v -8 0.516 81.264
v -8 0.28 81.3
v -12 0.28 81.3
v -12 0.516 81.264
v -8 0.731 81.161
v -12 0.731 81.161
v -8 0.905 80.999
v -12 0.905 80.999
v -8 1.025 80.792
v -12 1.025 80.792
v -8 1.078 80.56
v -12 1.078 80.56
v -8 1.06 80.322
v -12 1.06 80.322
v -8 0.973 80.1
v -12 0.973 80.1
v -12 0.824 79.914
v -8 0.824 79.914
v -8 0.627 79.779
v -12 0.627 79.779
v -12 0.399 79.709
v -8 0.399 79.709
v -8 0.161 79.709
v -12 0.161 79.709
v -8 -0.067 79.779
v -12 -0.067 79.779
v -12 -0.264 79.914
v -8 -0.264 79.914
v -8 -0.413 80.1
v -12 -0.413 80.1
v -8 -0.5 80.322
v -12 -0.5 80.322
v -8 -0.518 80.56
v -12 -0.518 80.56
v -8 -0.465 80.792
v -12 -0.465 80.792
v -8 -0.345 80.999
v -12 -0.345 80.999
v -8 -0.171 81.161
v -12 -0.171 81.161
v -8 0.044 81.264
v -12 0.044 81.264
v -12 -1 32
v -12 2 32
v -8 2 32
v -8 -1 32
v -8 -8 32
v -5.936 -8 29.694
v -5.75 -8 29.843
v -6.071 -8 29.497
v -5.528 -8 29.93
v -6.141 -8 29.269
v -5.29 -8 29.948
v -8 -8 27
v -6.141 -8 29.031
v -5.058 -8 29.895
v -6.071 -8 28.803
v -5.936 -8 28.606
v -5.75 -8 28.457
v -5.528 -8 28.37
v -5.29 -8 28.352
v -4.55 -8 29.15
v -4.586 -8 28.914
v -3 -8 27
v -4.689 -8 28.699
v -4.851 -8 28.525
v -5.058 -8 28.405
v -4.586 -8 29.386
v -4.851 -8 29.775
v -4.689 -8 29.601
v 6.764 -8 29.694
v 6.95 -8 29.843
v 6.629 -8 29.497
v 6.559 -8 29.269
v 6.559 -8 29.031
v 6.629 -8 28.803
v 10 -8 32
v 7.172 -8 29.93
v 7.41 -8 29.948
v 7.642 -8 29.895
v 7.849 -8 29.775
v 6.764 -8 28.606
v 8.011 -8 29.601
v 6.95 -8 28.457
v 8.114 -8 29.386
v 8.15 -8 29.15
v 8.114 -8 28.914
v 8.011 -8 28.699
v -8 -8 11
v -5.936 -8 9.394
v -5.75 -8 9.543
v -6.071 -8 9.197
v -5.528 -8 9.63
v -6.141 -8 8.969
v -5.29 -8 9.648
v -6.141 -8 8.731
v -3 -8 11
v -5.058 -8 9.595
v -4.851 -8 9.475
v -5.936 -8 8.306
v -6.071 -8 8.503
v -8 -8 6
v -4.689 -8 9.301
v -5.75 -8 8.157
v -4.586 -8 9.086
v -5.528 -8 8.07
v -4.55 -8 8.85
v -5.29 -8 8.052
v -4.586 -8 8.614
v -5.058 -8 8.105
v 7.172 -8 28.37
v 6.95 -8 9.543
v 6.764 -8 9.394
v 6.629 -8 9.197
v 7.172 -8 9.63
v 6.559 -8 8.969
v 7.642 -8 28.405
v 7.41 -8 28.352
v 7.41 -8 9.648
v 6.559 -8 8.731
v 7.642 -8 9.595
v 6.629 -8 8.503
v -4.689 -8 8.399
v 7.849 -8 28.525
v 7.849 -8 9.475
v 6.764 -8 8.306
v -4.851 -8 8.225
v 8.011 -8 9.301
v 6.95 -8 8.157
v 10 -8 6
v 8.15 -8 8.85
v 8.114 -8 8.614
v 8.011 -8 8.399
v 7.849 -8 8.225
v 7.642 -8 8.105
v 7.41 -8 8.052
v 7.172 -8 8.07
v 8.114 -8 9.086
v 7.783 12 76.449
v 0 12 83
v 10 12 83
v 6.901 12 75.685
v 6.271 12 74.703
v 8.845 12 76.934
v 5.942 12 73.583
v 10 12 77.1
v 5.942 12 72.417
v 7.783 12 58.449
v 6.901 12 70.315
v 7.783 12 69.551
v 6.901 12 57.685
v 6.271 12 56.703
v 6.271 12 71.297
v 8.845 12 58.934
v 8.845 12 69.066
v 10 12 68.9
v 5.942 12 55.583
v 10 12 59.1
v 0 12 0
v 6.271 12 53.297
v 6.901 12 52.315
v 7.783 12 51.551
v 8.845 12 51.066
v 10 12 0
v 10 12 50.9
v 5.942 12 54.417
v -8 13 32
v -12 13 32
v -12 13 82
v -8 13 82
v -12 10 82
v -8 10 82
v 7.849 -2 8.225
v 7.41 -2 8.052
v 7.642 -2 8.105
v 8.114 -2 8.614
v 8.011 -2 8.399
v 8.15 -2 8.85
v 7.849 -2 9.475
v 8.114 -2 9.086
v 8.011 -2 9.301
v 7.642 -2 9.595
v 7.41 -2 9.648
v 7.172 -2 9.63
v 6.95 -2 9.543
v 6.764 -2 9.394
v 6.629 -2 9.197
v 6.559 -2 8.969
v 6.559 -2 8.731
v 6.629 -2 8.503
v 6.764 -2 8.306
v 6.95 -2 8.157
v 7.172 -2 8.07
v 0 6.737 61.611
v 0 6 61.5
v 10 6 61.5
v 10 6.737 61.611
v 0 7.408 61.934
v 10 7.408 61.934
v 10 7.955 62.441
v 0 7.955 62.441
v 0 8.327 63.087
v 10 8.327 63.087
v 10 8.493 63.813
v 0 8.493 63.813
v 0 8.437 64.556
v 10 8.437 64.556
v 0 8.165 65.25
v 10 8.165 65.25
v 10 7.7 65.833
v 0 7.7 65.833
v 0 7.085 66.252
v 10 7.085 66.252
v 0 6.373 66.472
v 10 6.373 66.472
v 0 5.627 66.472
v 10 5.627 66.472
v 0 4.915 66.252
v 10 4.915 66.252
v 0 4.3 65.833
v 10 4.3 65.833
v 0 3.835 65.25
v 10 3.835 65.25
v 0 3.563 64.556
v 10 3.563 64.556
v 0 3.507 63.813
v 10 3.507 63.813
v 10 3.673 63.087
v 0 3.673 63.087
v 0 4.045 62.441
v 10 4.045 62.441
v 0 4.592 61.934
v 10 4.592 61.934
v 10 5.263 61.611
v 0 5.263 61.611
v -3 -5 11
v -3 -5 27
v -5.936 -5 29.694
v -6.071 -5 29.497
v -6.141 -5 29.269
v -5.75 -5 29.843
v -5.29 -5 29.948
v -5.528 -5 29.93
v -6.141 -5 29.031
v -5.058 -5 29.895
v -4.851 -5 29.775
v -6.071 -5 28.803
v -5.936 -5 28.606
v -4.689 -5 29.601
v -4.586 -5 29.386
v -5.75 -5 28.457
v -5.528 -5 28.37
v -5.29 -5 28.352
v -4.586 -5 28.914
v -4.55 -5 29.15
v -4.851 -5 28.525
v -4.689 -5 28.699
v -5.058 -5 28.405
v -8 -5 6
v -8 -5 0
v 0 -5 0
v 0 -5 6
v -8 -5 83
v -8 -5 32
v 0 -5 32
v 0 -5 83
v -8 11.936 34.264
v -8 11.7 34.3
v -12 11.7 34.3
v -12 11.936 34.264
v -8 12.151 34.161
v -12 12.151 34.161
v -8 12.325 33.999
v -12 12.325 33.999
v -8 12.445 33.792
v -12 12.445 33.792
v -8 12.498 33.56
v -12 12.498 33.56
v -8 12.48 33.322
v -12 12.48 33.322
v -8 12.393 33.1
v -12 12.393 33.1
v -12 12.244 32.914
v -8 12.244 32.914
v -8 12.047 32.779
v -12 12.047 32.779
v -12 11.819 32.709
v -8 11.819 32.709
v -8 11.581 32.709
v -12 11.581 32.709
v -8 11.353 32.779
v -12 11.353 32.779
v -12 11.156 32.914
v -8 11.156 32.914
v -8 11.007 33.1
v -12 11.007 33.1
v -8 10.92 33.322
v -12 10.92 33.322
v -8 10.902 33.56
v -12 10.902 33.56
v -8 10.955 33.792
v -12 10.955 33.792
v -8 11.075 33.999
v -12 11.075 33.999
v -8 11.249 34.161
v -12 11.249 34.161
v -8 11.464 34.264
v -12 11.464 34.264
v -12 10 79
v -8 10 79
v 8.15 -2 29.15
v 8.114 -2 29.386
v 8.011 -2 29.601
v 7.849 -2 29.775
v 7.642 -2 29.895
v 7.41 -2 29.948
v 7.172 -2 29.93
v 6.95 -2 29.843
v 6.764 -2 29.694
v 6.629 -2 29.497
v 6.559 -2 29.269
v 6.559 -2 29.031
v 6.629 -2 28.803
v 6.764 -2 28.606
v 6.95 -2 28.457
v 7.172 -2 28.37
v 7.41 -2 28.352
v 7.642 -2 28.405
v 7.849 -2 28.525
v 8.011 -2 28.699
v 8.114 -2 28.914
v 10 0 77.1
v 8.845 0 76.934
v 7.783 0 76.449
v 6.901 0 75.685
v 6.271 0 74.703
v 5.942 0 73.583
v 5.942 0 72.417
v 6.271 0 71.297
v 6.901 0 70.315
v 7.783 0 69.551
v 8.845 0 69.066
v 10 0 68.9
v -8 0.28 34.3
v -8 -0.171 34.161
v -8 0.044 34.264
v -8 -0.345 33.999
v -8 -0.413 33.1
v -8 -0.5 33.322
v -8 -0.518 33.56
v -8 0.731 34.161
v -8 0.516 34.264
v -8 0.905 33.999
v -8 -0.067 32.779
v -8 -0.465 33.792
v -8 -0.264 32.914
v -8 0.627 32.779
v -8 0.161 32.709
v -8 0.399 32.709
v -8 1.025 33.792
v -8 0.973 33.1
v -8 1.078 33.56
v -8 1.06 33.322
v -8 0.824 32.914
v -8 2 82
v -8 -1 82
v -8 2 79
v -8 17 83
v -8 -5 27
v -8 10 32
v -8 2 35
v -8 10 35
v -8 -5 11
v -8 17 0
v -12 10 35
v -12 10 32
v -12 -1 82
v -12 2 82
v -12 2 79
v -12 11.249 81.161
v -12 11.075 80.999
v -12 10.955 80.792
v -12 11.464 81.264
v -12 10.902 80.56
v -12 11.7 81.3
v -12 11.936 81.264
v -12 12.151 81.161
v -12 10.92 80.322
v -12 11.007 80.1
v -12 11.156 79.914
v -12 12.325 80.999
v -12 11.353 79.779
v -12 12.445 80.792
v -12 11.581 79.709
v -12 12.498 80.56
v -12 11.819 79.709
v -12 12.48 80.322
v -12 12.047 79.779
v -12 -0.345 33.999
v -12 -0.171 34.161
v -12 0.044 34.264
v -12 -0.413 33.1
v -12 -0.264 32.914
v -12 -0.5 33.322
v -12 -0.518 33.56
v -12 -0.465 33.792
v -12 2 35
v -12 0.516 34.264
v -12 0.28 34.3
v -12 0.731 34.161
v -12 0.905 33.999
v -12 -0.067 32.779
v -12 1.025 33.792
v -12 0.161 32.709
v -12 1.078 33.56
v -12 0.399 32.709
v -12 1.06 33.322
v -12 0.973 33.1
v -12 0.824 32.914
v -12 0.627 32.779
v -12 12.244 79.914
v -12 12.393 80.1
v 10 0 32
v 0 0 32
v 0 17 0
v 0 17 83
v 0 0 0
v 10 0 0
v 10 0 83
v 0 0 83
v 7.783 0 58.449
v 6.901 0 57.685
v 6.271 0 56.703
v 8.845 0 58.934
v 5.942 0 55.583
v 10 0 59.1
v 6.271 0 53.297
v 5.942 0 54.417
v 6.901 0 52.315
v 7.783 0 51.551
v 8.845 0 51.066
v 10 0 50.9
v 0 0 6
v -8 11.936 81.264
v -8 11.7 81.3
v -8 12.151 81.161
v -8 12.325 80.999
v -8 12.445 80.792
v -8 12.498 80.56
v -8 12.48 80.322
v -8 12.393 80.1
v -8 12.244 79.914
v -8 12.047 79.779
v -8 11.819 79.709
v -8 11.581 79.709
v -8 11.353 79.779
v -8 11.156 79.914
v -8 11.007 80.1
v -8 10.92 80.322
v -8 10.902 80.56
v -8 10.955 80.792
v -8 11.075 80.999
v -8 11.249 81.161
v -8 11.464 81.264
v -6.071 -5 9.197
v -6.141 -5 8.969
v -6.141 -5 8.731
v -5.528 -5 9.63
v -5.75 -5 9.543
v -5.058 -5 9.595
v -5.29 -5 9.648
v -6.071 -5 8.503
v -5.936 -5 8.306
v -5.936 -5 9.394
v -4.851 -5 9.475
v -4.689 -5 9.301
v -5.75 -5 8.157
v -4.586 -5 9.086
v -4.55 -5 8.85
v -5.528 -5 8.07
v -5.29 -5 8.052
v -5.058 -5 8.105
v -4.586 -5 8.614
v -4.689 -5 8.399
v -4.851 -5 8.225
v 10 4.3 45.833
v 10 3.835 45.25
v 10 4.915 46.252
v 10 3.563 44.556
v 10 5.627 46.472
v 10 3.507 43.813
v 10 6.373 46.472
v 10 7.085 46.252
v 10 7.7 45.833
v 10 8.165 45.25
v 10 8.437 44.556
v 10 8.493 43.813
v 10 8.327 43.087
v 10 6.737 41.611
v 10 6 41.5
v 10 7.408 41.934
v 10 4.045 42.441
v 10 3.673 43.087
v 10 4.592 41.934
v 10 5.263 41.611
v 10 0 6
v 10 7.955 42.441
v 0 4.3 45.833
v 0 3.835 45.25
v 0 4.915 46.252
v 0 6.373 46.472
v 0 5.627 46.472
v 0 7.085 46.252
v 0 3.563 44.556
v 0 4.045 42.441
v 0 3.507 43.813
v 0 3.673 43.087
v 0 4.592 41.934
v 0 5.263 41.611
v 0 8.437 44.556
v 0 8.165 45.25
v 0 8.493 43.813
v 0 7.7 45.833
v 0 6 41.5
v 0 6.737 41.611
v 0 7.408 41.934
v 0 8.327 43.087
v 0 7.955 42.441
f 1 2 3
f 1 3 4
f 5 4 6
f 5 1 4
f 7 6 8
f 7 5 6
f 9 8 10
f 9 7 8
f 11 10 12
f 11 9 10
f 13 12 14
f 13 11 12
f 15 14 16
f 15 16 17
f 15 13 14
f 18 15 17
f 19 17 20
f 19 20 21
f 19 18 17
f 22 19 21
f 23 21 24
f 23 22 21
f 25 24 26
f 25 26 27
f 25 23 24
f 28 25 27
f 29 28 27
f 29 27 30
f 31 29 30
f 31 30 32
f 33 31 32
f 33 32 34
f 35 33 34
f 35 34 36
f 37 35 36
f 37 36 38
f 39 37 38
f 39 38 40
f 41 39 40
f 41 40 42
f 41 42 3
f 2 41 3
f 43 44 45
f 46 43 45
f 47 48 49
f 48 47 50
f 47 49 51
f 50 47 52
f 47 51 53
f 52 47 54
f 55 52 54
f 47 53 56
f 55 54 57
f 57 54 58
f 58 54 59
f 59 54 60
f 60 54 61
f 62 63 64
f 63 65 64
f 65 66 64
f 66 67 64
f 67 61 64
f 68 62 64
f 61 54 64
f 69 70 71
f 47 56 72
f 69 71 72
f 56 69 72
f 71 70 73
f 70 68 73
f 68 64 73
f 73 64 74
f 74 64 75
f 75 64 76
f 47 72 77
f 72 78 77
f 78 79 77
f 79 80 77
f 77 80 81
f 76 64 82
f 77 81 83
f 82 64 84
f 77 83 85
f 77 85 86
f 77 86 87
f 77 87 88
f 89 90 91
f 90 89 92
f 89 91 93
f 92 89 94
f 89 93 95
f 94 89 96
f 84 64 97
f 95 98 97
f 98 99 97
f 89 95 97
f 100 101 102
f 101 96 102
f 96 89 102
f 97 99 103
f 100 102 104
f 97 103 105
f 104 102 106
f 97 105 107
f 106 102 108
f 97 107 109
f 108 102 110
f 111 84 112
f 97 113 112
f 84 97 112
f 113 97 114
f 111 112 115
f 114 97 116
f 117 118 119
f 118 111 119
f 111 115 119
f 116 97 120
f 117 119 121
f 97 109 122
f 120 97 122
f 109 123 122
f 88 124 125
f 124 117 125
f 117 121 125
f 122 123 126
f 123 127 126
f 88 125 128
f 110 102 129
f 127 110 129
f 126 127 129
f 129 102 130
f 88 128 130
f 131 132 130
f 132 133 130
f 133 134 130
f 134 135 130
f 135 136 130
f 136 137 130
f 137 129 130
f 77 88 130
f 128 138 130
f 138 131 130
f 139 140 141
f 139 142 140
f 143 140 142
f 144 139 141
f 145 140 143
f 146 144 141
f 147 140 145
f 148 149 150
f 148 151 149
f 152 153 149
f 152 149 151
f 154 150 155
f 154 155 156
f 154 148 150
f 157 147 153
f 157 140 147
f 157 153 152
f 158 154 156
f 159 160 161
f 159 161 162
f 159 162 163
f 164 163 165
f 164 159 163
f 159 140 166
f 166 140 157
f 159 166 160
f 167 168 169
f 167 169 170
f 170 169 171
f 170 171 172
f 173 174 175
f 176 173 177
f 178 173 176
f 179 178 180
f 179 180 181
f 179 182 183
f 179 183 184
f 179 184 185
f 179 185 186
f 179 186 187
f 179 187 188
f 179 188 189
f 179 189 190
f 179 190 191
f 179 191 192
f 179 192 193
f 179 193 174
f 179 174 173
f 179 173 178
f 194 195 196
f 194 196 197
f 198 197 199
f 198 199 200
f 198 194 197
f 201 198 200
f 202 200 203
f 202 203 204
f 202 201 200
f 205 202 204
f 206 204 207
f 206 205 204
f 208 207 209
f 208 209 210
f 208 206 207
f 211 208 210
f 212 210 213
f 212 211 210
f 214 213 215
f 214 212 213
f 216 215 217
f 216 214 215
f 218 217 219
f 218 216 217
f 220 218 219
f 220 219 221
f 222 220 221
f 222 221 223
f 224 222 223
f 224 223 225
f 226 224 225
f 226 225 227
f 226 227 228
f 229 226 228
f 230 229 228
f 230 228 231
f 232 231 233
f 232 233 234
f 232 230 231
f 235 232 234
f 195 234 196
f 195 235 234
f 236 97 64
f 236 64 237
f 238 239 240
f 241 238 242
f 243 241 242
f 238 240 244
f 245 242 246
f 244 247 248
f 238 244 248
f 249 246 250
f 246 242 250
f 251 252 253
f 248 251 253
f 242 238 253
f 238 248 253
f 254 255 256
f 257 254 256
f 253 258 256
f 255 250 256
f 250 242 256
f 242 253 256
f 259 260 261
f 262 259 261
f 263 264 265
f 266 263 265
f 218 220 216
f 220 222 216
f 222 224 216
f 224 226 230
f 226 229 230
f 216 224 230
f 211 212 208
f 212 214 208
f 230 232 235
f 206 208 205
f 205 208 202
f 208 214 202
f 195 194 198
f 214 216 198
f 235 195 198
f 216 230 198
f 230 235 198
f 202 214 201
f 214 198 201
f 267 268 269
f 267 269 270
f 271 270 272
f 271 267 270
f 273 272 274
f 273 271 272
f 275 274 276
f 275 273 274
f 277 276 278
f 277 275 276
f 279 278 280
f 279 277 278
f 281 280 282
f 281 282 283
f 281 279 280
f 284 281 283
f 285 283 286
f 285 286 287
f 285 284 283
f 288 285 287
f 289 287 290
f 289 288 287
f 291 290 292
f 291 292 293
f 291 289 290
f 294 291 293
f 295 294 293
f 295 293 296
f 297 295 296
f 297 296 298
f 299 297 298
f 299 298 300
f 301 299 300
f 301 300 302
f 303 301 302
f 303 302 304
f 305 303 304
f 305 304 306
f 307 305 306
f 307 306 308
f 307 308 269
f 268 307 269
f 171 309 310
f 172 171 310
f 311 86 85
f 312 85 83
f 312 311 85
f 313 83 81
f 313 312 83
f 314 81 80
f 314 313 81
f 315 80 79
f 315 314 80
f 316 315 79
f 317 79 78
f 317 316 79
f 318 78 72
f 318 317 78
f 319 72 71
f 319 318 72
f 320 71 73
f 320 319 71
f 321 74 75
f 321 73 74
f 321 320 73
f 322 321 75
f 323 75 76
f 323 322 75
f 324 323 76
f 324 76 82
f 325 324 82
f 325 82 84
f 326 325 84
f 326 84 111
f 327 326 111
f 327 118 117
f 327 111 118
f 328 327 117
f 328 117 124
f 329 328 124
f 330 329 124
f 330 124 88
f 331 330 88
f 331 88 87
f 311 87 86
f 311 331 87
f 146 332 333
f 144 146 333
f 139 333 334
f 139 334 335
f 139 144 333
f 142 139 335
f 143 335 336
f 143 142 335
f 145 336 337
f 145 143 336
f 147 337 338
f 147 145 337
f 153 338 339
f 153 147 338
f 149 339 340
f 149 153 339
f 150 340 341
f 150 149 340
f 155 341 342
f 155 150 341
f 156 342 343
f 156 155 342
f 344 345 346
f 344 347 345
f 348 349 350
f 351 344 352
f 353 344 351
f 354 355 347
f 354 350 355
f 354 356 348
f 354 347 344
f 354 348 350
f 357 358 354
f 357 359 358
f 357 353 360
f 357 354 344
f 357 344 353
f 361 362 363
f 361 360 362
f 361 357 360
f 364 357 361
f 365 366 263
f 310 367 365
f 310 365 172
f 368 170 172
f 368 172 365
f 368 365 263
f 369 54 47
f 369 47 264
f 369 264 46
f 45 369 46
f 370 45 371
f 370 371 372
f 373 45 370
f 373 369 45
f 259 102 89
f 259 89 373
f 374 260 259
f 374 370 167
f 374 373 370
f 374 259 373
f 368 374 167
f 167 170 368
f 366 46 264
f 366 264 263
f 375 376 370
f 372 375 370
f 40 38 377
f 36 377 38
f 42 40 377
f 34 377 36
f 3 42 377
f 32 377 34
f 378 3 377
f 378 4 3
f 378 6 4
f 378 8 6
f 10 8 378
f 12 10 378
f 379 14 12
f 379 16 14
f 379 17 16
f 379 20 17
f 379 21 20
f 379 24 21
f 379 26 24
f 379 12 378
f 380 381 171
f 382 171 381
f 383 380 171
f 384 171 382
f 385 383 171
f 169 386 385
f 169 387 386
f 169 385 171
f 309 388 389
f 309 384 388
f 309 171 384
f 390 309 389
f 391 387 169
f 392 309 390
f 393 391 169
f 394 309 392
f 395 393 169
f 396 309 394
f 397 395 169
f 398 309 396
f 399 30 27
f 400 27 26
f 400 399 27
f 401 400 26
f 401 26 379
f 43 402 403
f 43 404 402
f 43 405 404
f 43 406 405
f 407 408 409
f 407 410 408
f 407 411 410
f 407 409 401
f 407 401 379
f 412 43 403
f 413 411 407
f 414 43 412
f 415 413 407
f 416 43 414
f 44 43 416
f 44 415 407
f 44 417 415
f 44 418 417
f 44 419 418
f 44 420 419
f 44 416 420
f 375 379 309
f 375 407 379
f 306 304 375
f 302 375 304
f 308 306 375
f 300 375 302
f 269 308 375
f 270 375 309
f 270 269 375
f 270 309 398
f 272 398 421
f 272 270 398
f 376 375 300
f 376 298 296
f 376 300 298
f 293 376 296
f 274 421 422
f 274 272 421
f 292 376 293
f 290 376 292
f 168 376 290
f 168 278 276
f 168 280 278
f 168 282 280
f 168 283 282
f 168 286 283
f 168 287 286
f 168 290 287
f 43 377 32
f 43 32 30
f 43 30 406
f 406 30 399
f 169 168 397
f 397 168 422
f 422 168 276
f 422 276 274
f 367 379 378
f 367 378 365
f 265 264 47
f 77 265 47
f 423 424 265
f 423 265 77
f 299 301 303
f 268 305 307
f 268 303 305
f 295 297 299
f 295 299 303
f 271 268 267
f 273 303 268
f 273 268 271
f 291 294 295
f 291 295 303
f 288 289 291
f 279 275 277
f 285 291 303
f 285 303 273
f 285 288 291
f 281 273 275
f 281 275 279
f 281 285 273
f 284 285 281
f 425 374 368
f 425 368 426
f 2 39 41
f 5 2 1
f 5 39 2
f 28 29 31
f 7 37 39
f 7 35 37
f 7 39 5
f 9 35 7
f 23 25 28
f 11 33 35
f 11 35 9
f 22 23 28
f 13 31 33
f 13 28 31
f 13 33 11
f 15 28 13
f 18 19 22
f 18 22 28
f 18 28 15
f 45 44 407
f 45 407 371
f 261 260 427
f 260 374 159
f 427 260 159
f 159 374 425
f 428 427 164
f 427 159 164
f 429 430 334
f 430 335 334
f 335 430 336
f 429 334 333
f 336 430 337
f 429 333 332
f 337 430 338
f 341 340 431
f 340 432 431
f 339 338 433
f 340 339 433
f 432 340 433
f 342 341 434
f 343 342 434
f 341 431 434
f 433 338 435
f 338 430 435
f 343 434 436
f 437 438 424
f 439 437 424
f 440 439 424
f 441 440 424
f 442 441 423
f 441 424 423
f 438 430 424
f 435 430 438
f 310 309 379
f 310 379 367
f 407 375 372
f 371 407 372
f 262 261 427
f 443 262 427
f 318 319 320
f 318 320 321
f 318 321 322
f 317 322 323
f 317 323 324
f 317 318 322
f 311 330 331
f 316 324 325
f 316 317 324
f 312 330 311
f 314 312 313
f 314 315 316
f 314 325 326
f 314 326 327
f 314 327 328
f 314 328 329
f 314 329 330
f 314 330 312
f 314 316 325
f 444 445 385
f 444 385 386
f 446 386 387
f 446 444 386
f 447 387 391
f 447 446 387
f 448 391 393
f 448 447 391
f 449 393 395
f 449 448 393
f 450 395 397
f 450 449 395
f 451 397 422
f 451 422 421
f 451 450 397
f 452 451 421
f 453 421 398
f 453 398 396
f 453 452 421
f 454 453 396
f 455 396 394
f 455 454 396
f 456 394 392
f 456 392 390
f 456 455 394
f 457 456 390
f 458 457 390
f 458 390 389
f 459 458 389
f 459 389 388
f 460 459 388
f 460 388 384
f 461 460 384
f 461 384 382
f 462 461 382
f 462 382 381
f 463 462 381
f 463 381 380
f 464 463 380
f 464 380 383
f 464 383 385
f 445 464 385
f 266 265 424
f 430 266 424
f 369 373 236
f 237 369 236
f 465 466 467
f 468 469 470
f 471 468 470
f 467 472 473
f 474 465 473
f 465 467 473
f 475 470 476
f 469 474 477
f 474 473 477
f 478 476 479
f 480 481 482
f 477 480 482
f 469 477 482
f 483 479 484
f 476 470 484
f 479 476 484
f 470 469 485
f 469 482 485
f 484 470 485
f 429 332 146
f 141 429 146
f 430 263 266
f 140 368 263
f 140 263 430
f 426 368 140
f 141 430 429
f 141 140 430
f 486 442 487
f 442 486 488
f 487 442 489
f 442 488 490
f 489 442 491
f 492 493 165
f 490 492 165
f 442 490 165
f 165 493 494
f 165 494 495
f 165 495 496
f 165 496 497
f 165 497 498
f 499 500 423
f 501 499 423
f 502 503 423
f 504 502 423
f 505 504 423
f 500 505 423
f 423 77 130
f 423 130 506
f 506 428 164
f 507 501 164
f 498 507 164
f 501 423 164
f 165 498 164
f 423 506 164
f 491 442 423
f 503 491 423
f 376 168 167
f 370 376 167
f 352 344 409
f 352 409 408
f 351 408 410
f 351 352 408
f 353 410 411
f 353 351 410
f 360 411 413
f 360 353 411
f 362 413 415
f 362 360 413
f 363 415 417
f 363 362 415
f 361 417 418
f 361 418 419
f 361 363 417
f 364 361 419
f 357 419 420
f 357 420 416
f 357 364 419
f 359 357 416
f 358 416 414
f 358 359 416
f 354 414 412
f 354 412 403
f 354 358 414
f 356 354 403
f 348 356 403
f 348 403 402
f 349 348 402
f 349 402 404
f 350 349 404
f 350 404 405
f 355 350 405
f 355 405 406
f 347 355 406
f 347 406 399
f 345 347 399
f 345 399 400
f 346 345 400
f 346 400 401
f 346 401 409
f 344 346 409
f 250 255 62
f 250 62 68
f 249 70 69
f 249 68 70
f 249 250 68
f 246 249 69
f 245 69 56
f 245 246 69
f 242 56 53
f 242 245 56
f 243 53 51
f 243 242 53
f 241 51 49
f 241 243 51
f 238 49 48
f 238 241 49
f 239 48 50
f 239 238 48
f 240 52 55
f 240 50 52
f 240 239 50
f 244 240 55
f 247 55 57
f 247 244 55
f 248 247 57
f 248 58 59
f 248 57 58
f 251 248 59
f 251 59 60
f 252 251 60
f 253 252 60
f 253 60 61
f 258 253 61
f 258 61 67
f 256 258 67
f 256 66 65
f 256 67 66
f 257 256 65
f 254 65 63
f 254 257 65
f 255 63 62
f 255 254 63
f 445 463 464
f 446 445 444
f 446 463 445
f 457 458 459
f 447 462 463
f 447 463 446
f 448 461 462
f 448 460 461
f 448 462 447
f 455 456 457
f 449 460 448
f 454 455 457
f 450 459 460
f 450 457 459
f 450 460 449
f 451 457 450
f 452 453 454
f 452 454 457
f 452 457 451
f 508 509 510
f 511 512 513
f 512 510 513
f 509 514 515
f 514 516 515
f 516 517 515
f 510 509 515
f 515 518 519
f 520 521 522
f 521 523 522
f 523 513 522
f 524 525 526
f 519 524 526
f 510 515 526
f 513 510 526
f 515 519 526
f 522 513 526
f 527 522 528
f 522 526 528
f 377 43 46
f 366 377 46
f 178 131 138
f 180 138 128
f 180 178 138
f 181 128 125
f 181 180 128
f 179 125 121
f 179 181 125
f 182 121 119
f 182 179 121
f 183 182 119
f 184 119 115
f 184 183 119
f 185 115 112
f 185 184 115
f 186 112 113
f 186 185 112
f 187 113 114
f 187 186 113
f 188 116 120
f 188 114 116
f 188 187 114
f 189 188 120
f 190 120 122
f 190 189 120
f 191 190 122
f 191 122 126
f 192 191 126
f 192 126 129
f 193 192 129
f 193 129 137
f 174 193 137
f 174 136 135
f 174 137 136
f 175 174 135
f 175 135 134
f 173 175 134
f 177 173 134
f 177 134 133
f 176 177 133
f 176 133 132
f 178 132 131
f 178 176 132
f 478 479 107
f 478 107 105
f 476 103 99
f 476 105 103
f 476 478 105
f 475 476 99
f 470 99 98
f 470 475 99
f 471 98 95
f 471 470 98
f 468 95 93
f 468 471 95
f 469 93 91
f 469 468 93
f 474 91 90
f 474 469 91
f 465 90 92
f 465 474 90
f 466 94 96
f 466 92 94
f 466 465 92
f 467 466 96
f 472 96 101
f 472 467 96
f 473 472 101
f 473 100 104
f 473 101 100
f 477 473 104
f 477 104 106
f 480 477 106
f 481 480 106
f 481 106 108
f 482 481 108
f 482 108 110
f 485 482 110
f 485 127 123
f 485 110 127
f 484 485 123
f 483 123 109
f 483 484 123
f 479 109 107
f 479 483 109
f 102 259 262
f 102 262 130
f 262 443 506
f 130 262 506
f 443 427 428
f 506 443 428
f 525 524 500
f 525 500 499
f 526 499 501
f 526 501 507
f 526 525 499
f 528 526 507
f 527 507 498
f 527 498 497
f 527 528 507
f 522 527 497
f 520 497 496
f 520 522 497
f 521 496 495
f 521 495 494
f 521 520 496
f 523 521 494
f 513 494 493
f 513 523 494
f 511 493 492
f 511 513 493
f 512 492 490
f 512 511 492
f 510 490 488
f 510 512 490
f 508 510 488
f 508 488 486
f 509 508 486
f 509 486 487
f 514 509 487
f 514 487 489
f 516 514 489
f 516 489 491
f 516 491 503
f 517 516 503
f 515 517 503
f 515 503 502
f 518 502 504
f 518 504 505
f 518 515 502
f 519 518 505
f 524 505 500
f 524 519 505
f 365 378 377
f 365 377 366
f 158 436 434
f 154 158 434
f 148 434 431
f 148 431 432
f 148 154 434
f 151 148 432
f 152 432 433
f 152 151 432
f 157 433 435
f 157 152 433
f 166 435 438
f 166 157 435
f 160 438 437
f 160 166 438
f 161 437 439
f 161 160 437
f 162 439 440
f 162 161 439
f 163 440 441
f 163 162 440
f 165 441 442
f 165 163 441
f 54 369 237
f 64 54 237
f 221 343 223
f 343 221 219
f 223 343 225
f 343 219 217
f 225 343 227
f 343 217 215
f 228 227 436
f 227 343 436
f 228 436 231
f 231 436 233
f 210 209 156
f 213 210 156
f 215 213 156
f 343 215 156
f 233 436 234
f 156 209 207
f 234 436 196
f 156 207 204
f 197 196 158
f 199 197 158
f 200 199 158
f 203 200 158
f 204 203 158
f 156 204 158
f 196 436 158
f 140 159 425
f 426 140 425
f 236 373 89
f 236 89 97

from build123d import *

# Parameters (mm, degrees)
CYLINDER035_R     = 2.5
CYLINDER035_DEPTH = 10
CYLINDER034_R     = 2.5
CYLINDER034_DEPTH = 10
CYLINDER023_R     = 4.1
CYLINDER023_DEPTH = 12
CYLINDER008_R     = 4.1
CYLINDER008_DEPTH = 12
BOX001_W          = 10
BOX001_H          = 12
BOX001_DEPTH      = 83
BOX007_W          = 5
BOX007_H          = 3
BOX007_DEPTH      = 16
CYLINDER027_R     = 0.8
CYLINDER027_DEPTH = 10
CYLINDER028_R     = 0.8
CYLINDER028_DEPTH = 10
CYLINDER029_R     = 0.8
CYLINDER029_DEPTH = 10
CYLINDER_R        = 0.8
CYLINDER_DEPTH    = 10
BOX003_W          = 18
BOX003_H          = 8
BOX003_DEPTH      = 26
CYLINDER031_R     = 0.8
CYLINDER031_DEPTH = 5
CYLINDER032_R     = 0.8
CYLINDER032_DEPTH = 5
CYLINDER033_R     = 0.8
CYLINDER033_DEPTH = 5
CYLINDER030_R     = 0.8
CYLINDER030_DEPTH = 5
BOX006_W          = 4
BOX006_H          = 8
BOX006_DEPTH      = 3
BOX009_W          = 4
BOX009_H          = 8
BOX009_DEPTH      = 3
BOX005_W          = 4
BOX005_H          = 14
BOX005_DEPTH      = 50
BOX004_W          = 8
BOX004_H          = 22
BOX004_DEPTH      = 83


with BuildPart() as screwhole001:
    # Cylinder035 → Cylinder035 (new body)
    with BuildSketch(Plane(origin=(0, 6, 44), x_dir=(0, 0, -1), z_dir=(1, 0, 0))):
        Circle(CYLINDER035_R)
    extrude(amount=CYLINDER035_DEPTH)


with BuildPart() as fusion:
    # Cylinder034 → Cylinder034 (new body)
    with BuildSketch(Plane(origin=(0, 6, 64), x_dir=(0, 0, -1), z_dir=(1, 0, 0))):
        Circle(CYLINDER034_R)
    extrude(amount=CYLINDER034_DEPTH)

    # Fusion: union ScrewHole001
    add(screwhole001.part)


with BuildPart() as polea1:
    # Cylinder023 → Cylinder023 (new body)
    with BuildSketch(Plane(origin=(10, 12, 73), x_dir=(1, 0, 0), z_dir=(0, -1, 0))):
        Circle(CYLINDER023_R)
    extrude(amount=CYLINDER023_DEPTH)


with BuildPart() as polea2:
    # Cylinder008 → Cylinder008 (new body)
    with BuildSketch(Plane(origin=(10, 12, 55), x_dir=(1, 0, 0), z_dir=(0, -1, 0))):
        Circle(CYLINDER008_R)
    extrude(amount=CYLINDER008_DEPTH)


with BuildPart() as clampsidea:
    # Box001 → Box001 (new body)
    with BuildSketch(Plane.XY):
        with Locations((5, 6)):
            Rectangle(BOX001_W, BOX001_H)
    extrude(amount=BOX001_DEPTH)

    # Cut005: cut PoleA2
    add(polea2.part, mode=Mode.SUBTRACT)

    # Cut015: cut PoleA1
    add(polea1.part, mode=Mode.SUBTRACT)

    # Cut016: cut Fusion
    add(fusion.part, mode=Mode.SUBTRACT)


with BuildPart() as cut015:
    # Box007 → Box007 (new body)
    with BuildSketch(Plane(origin=(-8, -8, 11), x_dir=(1, 0, 0), z_dir=(0, 0, 1))):
        with Locations((2.5, 1.5)):
            Rectangle(BOX007_W, BOX007_H)
    extrude(amount=BOX007_DEPTH)


with BuildPart() as ada_hole002:
    # Cylinder027 → Cylinder027 (new body)
    with BuildSketch(Plane(origin=(-5.35, -2, 8.85), x_dir=(1, 0, 0), z_dir=(0, -1, 0))):
        Circle(CYLINDER027_R)
    extrude(amount=CYLINDER027_DEPTH)


with BuildPart() as ada_hole003:
    # Cylinder028 → Cylinder028 (new body)
    with BuildSketch(Plane(origin=(7.35, -2, 29.15), x_dir=(1, 0, 0), z_dir=(0, -1, 0))):
        Circle(CYLINDER028_R)
    extrude(amount=CYLINDER028_DEPTH)


with BuildPart() as ada_hole004:
    # Cylinder029 → Cylinder029 (new body)
    with BuildSketch(Plane(origin=(-5.35, -2, 29.15), x_dir=(1, 0, 0), z_dir=(0, -1, 0))):
        Circle(CYLINDER029_R)
    extrude(amount=CYLINDER029_DEPTH)


with BuildPart() as ada_holes:
    # Cylinder → Cylinder (new body)
    with BuildSketch(Plane(origin=(7.35, -2, 8.85), x_dir=(1, 0, 0), z_dir=(0, -1, 0))):
        Circle(CYLINDER_R)
    extrude(amount=CYLINDER_DEPTH)

    # Fusion007: union ada hole002, ada hole003, ada hole004
    add(ada_hole002.part)
    add(ada_hole003.part)
    add(ada_hole004.part)


with BuildPart() as ada_plain_with_holes:
    # Box003 → Box003 (new body)
    with BuildSketch(Plane(origin=(-8, -8, 6), x_dir=(1, 0, 0), z_dir=(0, 0, 1))):
        with Locations((9, 4)):
            Rectangle(BOX003_W, BOX003_H)
    extrude(amount=BOX003_DEPTH)

    # Cut011: cut ada holes
    add(ada_holes.part, mode=Mode.SUBTRACT)

    # Cut014: cut Cut015
    add(cut015.part, mode=Mode.SUBTRACT)


with BuildPart() as pihole006:
    # Cylinder031 → Cylinder031 (new body)
    with BuildSketch(Plane(origin=(-3, 11.7, 2.5), x_dir=(0, 0, 1), z_dir=(-1, 0, 0))):
        Circle(CYLINDER031_R)
    extrude(amount=CYLINDER031_DEPTH)


with BuildPart() as pihole007:
    # Cylinder032 → Cylinder032 (new body)
    with BuildSketch(Plane(origin=(-3, 0.28, 49.5), x_dir=(0, 0, 1), z_dir=(-1, 0, 0))):
        Circle(CYLINDER032_R)
    extrude(amount=CYLINDER032_DEPTH)


with BuildPart() as pihole008:
    # Cylinder033 → Cylinder033 (new body)
    with BuildSketch(Plane(origin=(-3, 11.7, 49.5), x_dir=(0, 0, 1), z_dir=(-1, 0, 0))):
        Circle(CYLINDER033_R)
    extrude(amount=CYLINDER033_DEPTH)


with BuildPart() as pi_holes001:
    # Cylinder030 → Cylinder030 (new body)
    with BuildSketch(Plane(origin=(-3, 0.28, 2.5), x_dir=(0, 0, 1), z_dir=(-1, 0, 0))):
        Circle(CYLINDER030_R)
    extrude(amount=CYLINDER030_DEPTH)

    # Fusion008: union PiHole006, PiHole007, PiHole008
    add(pihole006.part)
    add(pihole007.part)
    add(pihole008.part)


with BuildPart() as pi_holes001_1:
    # Fusion008 placement: moved
    add(pi_holes001.part.moved(Location((-4, 0, 31))))


with BuildPart() as headercut1:
    # Box006 → Box006 (new body)
    with BuildSketch(Plane(origin=(-12, 2, 32), x_dir=(1, 0, 0), z_dir=(0, 0, 1))):
        with Locations((2, 4)):
            Rectangle(BOX006_W, BOX006_H)
    extrude(amount=BOX006_DEPTH)


with BuildPart() as headercut:
    # Box009 → Box009 (new body)
    with BuildSketch(Plane(origin=(-12, 2, 79), x_dir=(1, 0, 0), z_dir=(0, 0, 1))):
        with Locations((2, 4)):
            Rectangle(BOX009_W, BOX009_H)
    extrude(amount=BOX009_DEPTH)

    # Fusion009: union HeaderCut1
    add(headercut1.part)


with BuildPart() as cut018:
    # Box005 → Box005 (new body)
    with BuildSketch(Plane(origin=(-12, -1, 32), x_dir=(1, 0, 0), z_dir=(0, 0, 1))):
        with Locations((2, 7)):
            Rectangle(BOX005_W, BOX005_H)
    extrude(amount=BOX005_DEPTH)

    # Cut017: cut headercut
    add(headercut.part, mode=Mode.SUBTRACT)

    # Cut018: cut pi holes001
    add(pi_holes001_1.part, mode=Mode.SUBTRACT)


with BuildPart() as drucka:
    # Box004 → Box004 (new body)
    with BuildSketch(Plane(origin=(-8, -5, 0), x_dir=(1, 0, 0), z_dir=(0, 0, 1))):
        with Locations((4, 11)):
            Rectangle(BOX004_W, BOX004_H)
    extrude(amount=BOX004_DEPTH)

    # Fusion010: union Cut018
    add(cut018.part)

    # Fusion012: union ClampSideA, ada plain with holes
    add(clampsidea.part)
    add(ada_plain_with_holes.part)


solid = drucka.part
